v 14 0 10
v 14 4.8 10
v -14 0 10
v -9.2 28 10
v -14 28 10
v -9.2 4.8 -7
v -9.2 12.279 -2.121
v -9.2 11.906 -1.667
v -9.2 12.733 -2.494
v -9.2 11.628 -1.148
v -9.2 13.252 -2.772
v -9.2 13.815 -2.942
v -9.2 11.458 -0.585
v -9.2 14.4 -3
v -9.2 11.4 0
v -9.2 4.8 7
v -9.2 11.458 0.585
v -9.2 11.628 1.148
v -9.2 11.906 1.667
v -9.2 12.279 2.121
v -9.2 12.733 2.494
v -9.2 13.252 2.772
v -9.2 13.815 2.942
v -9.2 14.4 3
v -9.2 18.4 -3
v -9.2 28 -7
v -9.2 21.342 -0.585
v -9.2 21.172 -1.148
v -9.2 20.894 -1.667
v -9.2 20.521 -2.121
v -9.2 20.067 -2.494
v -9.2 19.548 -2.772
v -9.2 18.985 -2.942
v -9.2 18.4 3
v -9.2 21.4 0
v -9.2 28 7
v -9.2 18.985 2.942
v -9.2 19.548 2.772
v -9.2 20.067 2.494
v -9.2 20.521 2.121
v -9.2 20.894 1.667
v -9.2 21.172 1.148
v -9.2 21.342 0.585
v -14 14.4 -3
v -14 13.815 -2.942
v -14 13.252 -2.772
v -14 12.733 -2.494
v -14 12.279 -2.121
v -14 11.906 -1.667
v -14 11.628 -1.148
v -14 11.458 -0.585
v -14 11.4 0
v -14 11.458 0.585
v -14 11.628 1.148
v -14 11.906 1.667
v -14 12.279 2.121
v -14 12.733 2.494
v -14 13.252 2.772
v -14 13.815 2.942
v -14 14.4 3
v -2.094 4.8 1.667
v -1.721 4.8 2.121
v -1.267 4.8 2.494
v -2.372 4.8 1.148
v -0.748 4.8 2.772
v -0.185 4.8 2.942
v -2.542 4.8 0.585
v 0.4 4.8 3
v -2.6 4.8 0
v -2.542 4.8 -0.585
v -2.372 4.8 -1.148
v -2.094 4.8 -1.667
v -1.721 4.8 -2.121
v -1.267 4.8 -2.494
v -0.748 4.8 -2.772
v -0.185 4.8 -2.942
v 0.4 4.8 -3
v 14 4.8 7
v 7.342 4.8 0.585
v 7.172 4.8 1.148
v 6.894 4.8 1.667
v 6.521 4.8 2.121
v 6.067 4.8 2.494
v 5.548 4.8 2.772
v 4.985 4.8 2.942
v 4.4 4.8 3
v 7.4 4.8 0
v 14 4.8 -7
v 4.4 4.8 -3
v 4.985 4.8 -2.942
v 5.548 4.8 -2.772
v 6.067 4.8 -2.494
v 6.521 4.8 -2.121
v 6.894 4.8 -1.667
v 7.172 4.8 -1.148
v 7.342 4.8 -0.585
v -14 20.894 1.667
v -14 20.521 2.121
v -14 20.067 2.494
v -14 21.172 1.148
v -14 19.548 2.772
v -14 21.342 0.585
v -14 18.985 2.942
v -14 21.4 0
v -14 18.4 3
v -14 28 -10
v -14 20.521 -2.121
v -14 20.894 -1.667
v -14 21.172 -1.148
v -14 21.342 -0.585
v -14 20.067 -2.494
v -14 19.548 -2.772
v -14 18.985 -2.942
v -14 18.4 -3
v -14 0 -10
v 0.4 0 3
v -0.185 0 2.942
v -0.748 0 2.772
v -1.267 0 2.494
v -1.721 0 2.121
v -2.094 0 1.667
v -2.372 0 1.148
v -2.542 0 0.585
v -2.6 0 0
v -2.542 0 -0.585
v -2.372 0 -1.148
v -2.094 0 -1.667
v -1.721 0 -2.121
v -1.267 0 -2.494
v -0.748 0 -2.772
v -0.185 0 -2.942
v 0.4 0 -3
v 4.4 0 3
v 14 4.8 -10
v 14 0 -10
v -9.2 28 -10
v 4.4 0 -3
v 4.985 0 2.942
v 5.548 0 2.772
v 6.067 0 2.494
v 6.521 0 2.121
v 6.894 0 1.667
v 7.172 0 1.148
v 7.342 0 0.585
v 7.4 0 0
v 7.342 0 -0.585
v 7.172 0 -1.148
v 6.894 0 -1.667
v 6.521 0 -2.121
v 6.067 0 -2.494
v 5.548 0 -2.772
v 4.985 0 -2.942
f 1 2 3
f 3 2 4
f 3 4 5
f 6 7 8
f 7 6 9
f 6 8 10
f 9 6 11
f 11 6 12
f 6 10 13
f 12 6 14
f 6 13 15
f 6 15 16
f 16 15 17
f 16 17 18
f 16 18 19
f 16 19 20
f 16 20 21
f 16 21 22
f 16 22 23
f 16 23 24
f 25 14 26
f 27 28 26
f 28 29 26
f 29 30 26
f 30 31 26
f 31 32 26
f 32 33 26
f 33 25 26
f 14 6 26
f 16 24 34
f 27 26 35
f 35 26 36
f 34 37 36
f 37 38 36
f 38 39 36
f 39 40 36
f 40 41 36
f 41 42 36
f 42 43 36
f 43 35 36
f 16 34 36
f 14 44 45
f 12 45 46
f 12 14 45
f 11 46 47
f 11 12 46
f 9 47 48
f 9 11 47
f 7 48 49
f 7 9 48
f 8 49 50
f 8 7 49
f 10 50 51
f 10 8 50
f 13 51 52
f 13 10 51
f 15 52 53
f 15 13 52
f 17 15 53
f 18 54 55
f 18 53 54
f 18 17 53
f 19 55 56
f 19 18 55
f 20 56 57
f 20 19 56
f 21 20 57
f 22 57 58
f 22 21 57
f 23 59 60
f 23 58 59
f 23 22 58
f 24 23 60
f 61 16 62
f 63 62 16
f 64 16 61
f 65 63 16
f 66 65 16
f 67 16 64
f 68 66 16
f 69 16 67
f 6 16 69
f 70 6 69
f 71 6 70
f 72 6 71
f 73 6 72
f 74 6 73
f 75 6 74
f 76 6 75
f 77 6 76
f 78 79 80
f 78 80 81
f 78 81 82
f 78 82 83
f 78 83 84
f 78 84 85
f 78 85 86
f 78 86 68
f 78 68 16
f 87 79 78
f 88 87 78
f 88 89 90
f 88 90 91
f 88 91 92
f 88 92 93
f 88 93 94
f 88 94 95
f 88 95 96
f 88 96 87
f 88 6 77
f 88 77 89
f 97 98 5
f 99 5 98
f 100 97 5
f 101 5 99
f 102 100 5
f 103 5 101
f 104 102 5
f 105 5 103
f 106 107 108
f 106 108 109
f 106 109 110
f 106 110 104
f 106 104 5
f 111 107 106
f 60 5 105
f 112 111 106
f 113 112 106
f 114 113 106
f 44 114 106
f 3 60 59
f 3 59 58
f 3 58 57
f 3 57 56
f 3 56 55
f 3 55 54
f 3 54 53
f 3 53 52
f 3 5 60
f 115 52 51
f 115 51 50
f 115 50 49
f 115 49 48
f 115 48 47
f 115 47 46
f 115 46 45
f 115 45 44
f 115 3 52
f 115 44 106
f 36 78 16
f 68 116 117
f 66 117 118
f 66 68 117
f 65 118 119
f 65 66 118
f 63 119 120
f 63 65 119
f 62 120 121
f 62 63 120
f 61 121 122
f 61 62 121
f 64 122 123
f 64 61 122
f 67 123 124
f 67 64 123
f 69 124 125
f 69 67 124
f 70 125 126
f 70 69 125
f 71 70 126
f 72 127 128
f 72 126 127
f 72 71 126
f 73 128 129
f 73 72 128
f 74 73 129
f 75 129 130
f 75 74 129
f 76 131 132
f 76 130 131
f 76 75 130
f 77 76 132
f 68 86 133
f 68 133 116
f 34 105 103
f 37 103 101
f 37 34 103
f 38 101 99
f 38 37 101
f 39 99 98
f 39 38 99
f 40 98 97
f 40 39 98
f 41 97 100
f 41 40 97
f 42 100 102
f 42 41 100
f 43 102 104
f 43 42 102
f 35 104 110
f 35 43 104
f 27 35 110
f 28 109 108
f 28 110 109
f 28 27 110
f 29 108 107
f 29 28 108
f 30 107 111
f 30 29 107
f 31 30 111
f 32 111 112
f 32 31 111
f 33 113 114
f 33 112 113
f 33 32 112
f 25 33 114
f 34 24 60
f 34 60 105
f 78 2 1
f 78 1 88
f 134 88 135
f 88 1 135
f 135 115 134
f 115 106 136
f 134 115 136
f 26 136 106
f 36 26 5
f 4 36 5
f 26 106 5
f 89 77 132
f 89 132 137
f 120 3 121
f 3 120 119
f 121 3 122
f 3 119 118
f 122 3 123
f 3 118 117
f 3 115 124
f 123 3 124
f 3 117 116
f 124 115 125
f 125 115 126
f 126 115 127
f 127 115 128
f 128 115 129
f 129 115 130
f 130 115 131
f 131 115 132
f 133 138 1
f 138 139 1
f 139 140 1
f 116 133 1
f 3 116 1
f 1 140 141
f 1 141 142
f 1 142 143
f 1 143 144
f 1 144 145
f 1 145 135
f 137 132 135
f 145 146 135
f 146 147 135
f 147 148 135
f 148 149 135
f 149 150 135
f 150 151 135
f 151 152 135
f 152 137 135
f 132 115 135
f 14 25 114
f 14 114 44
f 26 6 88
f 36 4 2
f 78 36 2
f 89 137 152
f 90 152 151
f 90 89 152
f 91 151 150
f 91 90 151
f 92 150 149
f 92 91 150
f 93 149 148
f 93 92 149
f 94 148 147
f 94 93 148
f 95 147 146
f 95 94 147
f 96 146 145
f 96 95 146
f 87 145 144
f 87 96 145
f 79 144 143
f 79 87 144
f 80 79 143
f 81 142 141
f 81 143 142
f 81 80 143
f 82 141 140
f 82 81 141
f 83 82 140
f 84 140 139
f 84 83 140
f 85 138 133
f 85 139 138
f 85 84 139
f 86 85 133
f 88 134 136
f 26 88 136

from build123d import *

# Parameters (mm, degrees)
SKETCH1_W           = 28
SKETCH1_H           = 20
BOSS_EXTRUDE1_DEPTH = 4.8
SKETCH2_W           = 20
SKETCH2_H           = 28
BOSS_EXTRUDE2_DEPTH = 4.8
CUT_EXTRUDE1_DEPTH  = 5.8
CUT_EXTRUDE2_DEPTH  = 5.8
BOSS_EXTRUDE3_DEPTH = 3
BOSS_EXTRUDE4_DEPTH = 3


with BuildPart() as part:
    # Sketch1 → Boss-Extrude1 (new body)
    with BuildSketch(Plane(origin=(0, 0, 0), x_dir=(1, 0, 0), z_dir=(0, 1, 0))):
        Rectangle(SKETCH1_W, SKETCH1_H)
    extrude(amount=BOSS_EXTRUDE1_DEPTH)

    # Sketch2 → Boss-Extrude2 (add)
    with BuildSketch(Plane.ZY.offset(14)):
        with Locations((0, 14)):
            Rectangle(SKETCH2_W, SKETCH2_H)
    extrude(amount=-BOSS_EXTRUDE2_DEPTH)

    # Sketch3 → Cut-Extrude1 (cut, through all)
    with BuildSketch(Plane(origin=(-9.2, 0, 0), x_dir=(0, 0, -1), z_dir=(1, 0, 0))):
        with BuildLine():
            Line((3, 18.4), (3, 14.4))
            ThreePointArc((3, 14.4), (0, 11.4), (-3, 14.4))
            Line((-3, 14.4), (-3, 18.4))
            ThreePointArc((-3, 18.4), (0, 21.4), (3, 18.4))
        make_face()
    extrude(amount=-CUT_EXTRUDE1_DEPTH, mode=Mode.SUBTRACT)

    # Sketch4 → Cut-Extrude2 (cut, through all)
    with BuildSketch(Plane(origin=(0, 4.8, 0), x_dir=(1, 0, 0), z_dir=(0, 1, 0))):
        with BuildLine():
            Line((0.4, 3), (4.4, 3))
            ThreePointArc((4.4, 3), (7.4, 0), (4.4, -3))
            Line((4.4, -3), (0.4, -3))
            ThreePointArc((0.4, -3), (-2.6, 0), (0.4, 3))
        make_face()
    extrude(amount=-CUT_EXTRUDE2_DEPTH, mode=Mode.SUBTRACT)

    # Sketch5 → Boss-Extrude3 (add)
    with BuildSketch(Plane.XY.offset(10)):
        Polygon((-9.2, 28), (14, 4.8), (-9.2, 4.8), align=None)
    extrude(amount=-BOSS_EXTRUDE3_DEPTH)

    # Sketch6 → Boss-Extrude4 (add)
    with BuildSketch(Plane(origin=(0, 0, -10), x_dir=(-1, 0, 0), z_dir=(0, 0, -1))):
        Polygon((9.2, 28), (9.2, 4.8), (-14, 4.8), align=None)
    extrude(amount=-BOSS_EXTRUDE4_DEPTH)


solid = part.part
